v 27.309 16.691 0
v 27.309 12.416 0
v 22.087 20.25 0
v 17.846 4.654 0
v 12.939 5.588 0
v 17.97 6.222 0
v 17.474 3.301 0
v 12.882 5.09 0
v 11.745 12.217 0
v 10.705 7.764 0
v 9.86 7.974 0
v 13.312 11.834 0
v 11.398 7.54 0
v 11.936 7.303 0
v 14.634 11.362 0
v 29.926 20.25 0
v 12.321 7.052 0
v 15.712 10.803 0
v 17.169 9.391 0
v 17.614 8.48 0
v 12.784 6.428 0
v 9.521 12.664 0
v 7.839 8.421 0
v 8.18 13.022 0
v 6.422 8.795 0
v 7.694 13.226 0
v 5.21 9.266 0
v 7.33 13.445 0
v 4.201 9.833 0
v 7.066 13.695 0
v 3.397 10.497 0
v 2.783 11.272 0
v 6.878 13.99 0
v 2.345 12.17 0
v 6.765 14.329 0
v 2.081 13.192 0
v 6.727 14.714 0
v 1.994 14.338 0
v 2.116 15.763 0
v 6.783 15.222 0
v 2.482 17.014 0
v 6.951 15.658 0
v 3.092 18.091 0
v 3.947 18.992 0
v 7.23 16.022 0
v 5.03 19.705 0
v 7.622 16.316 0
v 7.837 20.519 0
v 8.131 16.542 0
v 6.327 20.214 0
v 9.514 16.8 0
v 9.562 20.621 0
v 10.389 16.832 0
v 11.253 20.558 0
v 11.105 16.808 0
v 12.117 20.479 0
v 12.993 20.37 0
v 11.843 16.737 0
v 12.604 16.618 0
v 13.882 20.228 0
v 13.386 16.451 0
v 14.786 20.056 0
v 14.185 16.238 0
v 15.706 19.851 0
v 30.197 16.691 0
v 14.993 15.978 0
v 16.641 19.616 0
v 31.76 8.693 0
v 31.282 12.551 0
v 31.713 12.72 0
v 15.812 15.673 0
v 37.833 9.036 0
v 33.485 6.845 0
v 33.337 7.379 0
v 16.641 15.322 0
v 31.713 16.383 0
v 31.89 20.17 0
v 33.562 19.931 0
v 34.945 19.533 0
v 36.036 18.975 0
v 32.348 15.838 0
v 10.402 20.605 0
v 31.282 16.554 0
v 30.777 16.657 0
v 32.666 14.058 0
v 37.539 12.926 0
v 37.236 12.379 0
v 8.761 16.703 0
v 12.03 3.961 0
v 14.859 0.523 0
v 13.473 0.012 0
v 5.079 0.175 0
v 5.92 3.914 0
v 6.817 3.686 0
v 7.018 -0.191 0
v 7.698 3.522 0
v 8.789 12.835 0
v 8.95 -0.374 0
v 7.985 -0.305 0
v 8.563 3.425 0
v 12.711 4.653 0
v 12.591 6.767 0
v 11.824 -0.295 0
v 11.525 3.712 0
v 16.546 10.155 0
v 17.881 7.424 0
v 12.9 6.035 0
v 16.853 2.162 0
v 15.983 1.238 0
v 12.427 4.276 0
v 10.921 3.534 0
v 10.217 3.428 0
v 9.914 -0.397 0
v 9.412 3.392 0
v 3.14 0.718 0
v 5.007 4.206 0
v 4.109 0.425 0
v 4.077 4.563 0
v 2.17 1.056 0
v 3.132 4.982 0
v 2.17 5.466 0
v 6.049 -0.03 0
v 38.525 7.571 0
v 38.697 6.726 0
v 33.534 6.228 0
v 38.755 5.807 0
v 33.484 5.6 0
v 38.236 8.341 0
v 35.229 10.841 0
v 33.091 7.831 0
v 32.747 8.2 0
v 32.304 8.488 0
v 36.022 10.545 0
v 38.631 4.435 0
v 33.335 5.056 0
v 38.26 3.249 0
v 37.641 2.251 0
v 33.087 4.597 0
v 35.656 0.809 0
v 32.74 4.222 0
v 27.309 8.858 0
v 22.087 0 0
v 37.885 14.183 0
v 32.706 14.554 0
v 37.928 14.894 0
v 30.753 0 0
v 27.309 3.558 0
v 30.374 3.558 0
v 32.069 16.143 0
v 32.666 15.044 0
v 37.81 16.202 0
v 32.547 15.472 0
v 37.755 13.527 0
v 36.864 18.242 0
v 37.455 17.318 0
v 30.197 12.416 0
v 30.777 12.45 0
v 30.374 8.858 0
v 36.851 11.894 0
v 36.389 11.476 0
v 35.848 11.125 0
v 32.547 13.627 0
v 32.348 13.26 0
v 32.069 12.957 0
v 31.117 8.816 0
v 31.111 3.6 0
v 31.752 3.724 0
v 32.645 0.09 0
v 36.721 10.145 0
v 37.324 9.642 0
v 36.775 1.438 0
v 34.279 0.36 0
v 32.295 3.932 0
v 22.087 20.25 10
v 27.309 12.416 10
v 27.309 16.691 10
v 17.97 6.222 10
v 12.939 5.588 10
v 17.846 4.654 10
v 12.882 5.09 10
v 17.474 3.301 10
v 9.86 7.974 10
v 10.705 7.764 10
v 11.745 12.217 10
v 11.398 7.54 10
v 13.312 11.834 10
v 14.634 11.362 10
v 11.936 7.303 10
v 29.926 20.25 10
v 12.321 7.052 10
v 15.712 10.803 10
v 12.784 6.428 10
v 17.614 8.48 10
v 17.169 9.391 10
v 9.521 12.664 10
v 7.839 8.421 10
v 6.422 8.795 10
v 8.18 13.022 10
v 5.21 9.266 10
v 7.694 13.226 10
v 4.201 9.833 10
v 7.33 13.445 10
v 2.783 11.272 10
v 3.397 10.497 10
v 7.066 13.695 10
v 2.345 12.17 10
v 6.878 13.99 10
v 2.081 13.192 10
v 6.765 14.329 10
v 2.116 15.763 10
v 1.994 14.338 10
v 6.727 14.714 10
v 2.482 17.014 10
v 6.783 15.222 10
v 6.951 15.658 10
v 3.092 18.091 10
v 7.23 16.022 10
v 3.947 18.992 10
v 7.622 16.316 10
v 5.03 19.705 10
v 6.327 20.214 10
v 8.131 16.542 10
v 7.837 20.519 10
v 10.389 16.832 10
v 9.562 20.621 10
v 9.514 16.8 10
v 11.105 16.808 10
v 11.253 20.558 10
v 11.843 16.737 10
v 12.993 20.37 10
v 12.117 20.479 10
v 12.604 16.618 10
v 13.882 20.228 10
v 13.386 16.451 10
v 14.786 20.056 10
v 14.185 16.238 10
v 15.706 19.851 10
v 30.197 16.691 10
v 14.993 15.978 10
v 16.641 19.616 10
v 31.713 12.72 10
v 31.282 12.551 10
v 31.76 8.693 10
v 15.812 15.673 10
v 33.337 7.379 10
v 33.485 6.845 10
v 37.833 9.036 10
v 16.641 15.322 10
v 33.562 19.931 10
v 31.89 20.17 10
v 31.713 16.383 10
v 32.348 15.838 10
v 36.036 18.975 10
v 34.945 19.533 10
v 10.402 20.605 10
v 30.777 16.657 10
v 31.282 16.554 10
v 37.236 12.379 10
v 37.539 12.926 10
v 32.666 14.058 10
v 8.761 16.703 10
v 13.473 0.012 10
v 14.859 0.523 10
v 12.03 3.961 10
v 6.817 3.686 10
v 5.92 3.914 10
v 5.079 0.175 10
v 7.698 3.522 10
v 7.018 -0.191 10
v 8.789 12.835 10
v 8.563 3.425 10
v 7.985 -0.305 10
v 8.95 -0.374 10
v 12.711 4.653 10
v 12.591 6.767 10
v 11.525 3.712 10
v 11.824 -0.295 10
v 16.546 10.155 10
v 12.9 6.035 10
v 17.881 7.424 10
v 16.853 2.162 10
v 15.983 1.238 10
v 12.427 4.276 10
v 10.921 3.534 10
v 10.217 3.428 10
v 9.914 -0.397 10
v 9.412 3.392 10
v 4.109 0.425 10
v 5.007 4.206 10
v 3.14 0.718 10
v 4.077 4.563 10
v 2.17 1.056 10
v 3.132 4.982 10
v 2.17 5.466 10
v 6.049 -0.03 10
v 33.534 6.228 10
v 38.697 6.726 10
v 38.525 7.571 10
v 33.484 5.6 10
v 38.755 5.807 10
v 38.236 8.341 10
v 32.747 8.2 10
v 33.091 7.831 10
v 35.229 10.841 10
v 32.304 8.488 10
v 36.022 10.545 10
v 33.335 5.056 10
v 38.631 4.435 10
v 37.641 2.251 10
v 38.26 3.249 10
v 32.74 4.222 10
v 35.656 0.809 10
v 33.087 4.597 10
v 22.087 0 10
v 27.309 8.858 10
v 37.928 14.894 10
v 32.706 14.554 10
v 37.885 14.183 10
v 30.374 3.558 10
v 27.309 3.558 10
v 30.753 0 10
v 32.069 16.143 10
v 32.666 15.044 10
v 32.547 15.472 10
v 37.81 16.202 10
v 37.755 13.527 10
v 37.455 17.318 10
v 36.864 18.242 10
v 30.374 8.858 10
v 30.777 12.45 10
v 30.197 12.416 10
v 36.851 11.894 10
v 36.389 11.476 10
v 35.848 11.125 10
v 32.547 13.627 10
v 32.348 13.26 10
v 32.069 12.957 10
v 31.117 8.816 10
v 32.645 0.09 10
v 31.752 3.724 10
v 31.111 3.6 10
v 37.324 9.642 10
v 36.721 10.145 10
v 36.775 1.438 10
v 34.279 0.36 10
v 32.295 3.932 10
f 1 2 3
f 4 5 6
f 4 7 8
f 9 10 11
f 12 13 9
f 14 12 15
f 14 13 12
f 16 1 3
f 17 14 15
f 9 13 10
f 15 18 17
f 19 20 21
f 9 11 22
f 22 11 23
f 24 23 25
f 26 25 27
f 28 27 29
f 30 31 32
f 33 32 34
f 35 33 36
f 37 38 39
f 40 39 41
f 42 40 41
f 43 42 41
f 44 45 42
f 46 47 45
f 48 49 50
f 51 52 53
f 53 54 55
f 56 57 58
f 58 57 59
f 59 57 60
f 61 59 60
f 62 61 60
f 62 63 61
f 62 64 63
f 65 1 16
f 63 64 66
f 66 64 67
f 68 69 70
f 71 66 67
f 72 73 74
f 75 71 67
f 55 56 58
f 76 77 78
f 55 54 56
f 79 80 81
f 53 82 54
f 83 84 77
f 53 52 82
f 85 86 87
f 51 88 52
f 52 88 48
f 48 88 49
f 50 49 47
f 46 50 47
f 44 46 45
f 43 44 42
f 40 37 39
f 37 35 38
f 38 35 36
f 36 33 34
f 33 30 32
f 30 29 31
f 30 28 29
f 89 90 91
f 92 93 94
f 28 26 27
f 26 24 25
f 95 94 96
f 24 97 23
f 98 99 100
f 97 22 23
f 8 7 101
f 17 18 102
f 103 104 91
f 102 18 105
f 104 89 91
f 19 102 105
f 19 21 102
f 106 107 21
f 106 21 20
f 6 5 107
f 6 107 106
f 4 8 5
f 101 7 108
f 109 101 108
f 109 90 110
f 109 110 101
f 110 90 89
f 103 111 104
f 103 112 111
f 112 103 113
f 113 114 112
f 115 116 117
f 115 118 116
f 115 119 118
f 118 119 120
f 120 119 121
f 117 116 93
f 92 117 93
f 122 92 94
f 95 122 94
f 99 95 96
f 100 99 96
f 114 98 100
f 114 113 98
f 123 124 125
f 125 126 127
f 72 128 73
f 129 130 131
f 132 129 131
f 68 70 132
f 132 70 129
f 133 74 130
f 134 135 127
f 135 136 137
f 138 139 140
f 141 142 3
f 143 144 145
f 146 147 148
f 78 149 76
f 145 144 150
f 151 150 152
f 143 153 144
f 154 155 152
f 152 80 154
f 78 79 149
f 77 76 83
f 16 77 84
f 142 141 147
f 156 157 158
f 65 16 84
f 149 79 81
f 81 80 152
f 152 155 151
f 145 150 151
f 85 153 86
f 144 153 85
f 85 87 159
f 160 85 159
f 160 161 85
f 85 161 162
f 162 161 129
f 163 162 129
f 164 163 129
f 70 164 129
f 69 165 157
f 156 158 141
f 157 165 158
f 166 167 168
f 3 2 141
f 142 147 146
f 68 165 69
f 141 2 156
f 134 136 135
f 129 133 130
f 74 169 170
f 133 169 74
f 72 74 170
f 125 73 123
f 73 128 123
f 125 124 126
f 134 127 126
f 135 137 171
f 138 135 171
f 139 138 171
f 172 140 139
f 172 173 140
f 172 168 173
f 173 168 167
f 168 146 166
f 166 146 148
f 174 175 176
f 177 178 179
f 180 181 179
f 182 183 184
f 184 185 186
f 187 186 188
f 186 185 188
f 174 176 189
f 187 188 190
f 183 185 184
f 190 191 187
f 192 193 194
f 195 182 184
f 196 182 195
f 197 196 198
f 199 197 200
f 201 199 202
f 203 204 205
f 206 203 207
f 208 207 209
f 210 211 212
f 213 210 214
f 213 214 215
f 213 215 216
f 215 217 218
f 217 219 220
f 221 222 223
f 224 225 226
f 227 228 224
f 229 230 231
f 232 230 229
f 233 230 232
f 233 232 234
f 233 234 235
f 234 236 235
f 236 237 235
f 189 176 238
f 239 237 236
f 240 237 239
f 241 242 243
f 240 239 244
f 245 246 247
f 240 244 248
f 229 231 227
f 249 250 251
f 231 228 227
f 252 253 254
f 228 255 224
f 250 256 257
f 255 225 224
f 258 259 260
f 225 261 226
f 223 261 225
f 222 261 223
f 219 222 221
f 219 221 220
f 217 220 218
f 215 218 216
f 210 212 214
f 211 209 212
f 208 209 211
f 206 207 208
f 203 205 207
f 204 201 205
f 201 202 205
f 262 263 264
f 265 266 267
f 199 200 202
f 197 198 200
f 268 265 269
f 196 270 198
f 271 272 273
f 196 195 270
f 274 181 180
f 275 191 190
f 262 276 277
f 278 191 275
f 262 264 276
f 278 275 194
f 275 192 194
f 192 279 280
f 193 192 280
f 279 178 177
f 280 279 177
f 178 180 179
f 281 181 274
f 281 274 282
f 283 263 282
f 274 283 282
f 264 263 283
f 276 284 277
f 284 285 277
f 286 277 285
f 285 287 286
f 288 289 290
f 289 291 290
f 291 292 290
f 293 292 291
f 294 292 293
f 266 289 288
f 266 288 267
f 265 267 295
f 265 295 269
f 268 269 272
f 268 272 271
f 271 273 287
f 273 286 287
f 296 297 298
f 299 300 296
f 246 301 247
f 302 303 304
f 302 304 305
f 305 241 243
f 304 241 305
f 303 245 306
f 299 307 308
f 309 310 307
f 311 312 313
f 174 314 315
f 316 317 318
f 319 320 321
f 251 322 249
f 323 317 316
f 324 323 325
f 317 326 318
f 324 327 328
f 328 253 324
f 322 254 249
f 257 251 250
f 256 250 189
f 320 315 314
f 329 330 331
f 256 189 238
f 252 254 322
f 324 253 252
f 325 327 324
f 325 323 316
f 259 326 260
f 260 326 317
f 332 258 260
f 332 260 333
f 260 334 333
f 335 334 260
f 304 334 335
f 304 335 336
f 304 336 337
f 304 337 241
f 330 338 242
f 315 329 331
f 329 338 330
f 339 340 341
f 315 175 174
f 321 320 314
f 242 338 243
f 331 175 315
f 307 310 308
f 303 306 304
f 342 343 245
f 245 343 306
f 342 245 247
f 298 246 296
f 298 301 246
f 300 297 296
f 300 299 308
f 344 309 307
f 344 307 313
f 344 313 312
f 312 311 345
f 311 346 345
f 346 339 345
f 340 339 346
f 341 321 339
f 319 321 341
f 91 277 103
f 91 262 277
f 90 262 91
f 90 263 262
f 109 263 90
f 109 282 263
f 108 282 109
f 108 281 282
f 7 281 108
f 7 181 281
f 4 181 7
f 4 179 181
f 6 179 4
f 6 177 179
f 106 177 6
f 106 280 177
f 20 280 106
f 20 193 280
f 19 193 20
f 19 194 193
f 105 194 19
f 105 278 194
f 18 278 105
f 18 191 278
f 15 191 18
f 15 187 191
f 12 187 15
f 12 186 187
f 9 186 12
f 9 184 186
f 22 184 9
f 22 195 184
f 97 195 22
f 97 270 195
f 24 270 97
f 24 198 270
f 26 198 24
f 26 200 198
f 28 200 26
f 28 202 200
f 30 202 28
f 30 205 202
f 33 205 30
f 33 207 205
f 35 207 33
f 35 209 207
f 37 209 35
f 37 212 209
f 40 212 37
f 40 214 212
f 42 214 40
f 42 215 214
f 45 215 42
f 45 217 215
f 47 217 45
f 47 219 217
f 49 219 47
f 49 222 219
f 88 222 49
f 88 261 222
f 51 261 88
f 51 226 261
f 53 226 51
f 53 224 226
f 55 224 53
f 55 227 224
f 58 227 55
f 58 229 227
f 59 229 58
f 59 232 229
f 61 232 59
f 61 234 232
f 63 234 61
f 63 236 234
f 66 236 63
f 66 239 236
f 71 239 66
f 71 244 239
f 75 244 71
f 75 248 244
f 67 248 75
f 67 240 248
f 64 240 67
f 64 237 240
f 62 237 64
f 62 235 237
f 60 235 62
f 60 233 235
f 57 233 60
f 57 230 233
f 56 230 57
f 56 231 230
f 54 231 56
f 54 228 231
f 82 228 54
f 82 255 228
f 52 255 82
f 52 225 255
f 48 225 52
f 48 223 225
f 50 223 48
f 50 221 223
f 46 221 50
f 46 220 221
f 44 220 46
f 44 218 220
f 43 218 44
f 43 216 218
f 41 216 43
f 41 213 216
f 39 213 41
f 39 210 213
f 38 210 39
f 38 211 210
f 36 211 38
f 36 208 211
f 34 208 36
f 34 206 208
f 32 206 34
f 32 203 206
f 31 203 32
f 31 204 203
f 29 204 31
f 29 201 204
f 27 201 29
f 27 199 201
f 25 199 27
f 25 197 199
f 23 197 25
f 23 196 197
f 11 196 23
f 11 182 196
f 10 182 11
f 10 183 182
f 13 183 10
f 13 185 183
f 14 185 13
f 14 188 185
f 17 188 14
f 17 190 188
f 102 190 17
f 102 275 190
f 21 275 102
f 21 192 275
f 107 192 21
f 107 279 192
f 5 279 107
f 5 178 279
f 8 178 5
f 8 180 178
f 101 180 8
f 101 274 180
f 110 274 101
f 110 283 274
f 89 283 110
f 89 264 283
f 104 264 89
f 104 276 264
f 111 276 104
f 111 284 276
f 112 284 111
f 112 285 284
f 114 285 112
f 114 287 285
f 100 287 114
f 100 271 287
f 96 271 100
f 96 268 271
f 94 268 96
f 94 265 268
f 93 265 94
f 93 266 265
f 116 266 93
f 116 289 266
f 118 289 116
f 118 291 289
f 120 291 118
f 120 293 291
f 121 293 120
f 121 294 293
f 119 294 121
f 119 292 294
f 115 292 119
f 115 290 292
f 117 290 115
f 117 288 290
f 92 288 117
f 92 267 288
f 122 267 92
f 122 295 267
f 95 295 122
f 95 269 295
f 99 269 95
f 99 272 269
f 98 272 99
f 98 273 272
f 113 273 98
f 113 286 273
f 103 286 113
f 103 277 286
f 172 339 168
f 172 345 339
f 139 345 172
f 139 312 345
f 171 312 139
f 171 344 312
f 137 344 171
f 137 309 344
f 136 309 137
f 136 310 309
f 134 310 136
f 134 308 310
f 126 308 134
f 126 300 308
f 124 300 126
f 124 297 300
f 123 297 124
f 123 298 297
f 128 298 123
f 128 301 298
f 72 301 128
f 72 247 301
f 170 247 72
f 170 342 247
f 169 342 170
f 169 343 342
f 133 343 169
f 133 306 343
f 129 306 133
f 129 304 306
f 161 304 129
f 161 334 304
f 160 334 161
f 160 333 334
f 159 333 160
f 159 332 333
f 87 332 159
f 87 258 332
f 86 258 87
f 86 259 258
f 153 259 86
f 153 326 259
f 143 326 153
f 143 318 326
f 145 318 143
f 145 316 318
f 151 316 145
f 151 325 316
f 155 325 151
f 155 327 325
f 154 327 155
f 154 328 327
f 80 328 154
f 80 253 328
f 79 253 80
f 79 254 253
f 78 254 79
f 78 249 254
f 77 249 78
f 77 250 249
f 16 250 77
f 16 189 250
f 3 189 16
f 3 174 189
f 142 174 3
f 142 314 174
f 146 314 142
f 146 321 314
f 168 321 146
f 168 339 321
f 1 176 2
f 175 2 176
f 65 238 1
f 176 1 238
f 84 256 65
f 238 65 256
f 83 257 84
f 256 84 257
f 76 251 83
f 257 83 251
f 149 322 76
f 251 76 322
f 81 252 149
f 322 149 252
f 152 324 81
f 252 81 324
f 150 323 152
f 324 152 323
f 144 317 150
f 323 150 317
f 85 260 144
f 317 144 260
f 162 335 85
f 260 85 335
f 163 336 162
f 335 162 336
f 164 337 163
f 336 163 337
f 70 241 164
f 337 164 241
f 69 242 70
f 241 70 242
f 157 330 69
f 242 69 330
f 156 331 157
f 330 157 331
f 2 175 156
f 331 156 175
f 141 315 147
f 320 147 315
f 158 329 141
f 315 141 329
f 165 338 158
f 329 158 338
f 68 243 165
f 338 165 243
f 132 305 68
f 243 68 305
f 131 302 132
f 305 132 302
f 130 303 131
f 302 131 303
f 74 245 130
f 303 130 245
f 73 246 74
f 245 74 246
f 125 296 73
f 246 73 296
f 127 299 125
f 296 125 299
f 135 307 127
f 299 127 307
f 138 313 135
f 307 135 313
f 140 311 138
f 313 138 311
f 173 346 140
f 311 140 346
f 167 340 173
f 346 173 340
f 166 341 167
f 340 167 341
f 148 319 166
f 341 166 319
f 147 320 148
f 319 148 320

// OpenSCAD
linear_extrude(10)
    text("SB", font="Chalkboard:style=Bold", size = 20);
